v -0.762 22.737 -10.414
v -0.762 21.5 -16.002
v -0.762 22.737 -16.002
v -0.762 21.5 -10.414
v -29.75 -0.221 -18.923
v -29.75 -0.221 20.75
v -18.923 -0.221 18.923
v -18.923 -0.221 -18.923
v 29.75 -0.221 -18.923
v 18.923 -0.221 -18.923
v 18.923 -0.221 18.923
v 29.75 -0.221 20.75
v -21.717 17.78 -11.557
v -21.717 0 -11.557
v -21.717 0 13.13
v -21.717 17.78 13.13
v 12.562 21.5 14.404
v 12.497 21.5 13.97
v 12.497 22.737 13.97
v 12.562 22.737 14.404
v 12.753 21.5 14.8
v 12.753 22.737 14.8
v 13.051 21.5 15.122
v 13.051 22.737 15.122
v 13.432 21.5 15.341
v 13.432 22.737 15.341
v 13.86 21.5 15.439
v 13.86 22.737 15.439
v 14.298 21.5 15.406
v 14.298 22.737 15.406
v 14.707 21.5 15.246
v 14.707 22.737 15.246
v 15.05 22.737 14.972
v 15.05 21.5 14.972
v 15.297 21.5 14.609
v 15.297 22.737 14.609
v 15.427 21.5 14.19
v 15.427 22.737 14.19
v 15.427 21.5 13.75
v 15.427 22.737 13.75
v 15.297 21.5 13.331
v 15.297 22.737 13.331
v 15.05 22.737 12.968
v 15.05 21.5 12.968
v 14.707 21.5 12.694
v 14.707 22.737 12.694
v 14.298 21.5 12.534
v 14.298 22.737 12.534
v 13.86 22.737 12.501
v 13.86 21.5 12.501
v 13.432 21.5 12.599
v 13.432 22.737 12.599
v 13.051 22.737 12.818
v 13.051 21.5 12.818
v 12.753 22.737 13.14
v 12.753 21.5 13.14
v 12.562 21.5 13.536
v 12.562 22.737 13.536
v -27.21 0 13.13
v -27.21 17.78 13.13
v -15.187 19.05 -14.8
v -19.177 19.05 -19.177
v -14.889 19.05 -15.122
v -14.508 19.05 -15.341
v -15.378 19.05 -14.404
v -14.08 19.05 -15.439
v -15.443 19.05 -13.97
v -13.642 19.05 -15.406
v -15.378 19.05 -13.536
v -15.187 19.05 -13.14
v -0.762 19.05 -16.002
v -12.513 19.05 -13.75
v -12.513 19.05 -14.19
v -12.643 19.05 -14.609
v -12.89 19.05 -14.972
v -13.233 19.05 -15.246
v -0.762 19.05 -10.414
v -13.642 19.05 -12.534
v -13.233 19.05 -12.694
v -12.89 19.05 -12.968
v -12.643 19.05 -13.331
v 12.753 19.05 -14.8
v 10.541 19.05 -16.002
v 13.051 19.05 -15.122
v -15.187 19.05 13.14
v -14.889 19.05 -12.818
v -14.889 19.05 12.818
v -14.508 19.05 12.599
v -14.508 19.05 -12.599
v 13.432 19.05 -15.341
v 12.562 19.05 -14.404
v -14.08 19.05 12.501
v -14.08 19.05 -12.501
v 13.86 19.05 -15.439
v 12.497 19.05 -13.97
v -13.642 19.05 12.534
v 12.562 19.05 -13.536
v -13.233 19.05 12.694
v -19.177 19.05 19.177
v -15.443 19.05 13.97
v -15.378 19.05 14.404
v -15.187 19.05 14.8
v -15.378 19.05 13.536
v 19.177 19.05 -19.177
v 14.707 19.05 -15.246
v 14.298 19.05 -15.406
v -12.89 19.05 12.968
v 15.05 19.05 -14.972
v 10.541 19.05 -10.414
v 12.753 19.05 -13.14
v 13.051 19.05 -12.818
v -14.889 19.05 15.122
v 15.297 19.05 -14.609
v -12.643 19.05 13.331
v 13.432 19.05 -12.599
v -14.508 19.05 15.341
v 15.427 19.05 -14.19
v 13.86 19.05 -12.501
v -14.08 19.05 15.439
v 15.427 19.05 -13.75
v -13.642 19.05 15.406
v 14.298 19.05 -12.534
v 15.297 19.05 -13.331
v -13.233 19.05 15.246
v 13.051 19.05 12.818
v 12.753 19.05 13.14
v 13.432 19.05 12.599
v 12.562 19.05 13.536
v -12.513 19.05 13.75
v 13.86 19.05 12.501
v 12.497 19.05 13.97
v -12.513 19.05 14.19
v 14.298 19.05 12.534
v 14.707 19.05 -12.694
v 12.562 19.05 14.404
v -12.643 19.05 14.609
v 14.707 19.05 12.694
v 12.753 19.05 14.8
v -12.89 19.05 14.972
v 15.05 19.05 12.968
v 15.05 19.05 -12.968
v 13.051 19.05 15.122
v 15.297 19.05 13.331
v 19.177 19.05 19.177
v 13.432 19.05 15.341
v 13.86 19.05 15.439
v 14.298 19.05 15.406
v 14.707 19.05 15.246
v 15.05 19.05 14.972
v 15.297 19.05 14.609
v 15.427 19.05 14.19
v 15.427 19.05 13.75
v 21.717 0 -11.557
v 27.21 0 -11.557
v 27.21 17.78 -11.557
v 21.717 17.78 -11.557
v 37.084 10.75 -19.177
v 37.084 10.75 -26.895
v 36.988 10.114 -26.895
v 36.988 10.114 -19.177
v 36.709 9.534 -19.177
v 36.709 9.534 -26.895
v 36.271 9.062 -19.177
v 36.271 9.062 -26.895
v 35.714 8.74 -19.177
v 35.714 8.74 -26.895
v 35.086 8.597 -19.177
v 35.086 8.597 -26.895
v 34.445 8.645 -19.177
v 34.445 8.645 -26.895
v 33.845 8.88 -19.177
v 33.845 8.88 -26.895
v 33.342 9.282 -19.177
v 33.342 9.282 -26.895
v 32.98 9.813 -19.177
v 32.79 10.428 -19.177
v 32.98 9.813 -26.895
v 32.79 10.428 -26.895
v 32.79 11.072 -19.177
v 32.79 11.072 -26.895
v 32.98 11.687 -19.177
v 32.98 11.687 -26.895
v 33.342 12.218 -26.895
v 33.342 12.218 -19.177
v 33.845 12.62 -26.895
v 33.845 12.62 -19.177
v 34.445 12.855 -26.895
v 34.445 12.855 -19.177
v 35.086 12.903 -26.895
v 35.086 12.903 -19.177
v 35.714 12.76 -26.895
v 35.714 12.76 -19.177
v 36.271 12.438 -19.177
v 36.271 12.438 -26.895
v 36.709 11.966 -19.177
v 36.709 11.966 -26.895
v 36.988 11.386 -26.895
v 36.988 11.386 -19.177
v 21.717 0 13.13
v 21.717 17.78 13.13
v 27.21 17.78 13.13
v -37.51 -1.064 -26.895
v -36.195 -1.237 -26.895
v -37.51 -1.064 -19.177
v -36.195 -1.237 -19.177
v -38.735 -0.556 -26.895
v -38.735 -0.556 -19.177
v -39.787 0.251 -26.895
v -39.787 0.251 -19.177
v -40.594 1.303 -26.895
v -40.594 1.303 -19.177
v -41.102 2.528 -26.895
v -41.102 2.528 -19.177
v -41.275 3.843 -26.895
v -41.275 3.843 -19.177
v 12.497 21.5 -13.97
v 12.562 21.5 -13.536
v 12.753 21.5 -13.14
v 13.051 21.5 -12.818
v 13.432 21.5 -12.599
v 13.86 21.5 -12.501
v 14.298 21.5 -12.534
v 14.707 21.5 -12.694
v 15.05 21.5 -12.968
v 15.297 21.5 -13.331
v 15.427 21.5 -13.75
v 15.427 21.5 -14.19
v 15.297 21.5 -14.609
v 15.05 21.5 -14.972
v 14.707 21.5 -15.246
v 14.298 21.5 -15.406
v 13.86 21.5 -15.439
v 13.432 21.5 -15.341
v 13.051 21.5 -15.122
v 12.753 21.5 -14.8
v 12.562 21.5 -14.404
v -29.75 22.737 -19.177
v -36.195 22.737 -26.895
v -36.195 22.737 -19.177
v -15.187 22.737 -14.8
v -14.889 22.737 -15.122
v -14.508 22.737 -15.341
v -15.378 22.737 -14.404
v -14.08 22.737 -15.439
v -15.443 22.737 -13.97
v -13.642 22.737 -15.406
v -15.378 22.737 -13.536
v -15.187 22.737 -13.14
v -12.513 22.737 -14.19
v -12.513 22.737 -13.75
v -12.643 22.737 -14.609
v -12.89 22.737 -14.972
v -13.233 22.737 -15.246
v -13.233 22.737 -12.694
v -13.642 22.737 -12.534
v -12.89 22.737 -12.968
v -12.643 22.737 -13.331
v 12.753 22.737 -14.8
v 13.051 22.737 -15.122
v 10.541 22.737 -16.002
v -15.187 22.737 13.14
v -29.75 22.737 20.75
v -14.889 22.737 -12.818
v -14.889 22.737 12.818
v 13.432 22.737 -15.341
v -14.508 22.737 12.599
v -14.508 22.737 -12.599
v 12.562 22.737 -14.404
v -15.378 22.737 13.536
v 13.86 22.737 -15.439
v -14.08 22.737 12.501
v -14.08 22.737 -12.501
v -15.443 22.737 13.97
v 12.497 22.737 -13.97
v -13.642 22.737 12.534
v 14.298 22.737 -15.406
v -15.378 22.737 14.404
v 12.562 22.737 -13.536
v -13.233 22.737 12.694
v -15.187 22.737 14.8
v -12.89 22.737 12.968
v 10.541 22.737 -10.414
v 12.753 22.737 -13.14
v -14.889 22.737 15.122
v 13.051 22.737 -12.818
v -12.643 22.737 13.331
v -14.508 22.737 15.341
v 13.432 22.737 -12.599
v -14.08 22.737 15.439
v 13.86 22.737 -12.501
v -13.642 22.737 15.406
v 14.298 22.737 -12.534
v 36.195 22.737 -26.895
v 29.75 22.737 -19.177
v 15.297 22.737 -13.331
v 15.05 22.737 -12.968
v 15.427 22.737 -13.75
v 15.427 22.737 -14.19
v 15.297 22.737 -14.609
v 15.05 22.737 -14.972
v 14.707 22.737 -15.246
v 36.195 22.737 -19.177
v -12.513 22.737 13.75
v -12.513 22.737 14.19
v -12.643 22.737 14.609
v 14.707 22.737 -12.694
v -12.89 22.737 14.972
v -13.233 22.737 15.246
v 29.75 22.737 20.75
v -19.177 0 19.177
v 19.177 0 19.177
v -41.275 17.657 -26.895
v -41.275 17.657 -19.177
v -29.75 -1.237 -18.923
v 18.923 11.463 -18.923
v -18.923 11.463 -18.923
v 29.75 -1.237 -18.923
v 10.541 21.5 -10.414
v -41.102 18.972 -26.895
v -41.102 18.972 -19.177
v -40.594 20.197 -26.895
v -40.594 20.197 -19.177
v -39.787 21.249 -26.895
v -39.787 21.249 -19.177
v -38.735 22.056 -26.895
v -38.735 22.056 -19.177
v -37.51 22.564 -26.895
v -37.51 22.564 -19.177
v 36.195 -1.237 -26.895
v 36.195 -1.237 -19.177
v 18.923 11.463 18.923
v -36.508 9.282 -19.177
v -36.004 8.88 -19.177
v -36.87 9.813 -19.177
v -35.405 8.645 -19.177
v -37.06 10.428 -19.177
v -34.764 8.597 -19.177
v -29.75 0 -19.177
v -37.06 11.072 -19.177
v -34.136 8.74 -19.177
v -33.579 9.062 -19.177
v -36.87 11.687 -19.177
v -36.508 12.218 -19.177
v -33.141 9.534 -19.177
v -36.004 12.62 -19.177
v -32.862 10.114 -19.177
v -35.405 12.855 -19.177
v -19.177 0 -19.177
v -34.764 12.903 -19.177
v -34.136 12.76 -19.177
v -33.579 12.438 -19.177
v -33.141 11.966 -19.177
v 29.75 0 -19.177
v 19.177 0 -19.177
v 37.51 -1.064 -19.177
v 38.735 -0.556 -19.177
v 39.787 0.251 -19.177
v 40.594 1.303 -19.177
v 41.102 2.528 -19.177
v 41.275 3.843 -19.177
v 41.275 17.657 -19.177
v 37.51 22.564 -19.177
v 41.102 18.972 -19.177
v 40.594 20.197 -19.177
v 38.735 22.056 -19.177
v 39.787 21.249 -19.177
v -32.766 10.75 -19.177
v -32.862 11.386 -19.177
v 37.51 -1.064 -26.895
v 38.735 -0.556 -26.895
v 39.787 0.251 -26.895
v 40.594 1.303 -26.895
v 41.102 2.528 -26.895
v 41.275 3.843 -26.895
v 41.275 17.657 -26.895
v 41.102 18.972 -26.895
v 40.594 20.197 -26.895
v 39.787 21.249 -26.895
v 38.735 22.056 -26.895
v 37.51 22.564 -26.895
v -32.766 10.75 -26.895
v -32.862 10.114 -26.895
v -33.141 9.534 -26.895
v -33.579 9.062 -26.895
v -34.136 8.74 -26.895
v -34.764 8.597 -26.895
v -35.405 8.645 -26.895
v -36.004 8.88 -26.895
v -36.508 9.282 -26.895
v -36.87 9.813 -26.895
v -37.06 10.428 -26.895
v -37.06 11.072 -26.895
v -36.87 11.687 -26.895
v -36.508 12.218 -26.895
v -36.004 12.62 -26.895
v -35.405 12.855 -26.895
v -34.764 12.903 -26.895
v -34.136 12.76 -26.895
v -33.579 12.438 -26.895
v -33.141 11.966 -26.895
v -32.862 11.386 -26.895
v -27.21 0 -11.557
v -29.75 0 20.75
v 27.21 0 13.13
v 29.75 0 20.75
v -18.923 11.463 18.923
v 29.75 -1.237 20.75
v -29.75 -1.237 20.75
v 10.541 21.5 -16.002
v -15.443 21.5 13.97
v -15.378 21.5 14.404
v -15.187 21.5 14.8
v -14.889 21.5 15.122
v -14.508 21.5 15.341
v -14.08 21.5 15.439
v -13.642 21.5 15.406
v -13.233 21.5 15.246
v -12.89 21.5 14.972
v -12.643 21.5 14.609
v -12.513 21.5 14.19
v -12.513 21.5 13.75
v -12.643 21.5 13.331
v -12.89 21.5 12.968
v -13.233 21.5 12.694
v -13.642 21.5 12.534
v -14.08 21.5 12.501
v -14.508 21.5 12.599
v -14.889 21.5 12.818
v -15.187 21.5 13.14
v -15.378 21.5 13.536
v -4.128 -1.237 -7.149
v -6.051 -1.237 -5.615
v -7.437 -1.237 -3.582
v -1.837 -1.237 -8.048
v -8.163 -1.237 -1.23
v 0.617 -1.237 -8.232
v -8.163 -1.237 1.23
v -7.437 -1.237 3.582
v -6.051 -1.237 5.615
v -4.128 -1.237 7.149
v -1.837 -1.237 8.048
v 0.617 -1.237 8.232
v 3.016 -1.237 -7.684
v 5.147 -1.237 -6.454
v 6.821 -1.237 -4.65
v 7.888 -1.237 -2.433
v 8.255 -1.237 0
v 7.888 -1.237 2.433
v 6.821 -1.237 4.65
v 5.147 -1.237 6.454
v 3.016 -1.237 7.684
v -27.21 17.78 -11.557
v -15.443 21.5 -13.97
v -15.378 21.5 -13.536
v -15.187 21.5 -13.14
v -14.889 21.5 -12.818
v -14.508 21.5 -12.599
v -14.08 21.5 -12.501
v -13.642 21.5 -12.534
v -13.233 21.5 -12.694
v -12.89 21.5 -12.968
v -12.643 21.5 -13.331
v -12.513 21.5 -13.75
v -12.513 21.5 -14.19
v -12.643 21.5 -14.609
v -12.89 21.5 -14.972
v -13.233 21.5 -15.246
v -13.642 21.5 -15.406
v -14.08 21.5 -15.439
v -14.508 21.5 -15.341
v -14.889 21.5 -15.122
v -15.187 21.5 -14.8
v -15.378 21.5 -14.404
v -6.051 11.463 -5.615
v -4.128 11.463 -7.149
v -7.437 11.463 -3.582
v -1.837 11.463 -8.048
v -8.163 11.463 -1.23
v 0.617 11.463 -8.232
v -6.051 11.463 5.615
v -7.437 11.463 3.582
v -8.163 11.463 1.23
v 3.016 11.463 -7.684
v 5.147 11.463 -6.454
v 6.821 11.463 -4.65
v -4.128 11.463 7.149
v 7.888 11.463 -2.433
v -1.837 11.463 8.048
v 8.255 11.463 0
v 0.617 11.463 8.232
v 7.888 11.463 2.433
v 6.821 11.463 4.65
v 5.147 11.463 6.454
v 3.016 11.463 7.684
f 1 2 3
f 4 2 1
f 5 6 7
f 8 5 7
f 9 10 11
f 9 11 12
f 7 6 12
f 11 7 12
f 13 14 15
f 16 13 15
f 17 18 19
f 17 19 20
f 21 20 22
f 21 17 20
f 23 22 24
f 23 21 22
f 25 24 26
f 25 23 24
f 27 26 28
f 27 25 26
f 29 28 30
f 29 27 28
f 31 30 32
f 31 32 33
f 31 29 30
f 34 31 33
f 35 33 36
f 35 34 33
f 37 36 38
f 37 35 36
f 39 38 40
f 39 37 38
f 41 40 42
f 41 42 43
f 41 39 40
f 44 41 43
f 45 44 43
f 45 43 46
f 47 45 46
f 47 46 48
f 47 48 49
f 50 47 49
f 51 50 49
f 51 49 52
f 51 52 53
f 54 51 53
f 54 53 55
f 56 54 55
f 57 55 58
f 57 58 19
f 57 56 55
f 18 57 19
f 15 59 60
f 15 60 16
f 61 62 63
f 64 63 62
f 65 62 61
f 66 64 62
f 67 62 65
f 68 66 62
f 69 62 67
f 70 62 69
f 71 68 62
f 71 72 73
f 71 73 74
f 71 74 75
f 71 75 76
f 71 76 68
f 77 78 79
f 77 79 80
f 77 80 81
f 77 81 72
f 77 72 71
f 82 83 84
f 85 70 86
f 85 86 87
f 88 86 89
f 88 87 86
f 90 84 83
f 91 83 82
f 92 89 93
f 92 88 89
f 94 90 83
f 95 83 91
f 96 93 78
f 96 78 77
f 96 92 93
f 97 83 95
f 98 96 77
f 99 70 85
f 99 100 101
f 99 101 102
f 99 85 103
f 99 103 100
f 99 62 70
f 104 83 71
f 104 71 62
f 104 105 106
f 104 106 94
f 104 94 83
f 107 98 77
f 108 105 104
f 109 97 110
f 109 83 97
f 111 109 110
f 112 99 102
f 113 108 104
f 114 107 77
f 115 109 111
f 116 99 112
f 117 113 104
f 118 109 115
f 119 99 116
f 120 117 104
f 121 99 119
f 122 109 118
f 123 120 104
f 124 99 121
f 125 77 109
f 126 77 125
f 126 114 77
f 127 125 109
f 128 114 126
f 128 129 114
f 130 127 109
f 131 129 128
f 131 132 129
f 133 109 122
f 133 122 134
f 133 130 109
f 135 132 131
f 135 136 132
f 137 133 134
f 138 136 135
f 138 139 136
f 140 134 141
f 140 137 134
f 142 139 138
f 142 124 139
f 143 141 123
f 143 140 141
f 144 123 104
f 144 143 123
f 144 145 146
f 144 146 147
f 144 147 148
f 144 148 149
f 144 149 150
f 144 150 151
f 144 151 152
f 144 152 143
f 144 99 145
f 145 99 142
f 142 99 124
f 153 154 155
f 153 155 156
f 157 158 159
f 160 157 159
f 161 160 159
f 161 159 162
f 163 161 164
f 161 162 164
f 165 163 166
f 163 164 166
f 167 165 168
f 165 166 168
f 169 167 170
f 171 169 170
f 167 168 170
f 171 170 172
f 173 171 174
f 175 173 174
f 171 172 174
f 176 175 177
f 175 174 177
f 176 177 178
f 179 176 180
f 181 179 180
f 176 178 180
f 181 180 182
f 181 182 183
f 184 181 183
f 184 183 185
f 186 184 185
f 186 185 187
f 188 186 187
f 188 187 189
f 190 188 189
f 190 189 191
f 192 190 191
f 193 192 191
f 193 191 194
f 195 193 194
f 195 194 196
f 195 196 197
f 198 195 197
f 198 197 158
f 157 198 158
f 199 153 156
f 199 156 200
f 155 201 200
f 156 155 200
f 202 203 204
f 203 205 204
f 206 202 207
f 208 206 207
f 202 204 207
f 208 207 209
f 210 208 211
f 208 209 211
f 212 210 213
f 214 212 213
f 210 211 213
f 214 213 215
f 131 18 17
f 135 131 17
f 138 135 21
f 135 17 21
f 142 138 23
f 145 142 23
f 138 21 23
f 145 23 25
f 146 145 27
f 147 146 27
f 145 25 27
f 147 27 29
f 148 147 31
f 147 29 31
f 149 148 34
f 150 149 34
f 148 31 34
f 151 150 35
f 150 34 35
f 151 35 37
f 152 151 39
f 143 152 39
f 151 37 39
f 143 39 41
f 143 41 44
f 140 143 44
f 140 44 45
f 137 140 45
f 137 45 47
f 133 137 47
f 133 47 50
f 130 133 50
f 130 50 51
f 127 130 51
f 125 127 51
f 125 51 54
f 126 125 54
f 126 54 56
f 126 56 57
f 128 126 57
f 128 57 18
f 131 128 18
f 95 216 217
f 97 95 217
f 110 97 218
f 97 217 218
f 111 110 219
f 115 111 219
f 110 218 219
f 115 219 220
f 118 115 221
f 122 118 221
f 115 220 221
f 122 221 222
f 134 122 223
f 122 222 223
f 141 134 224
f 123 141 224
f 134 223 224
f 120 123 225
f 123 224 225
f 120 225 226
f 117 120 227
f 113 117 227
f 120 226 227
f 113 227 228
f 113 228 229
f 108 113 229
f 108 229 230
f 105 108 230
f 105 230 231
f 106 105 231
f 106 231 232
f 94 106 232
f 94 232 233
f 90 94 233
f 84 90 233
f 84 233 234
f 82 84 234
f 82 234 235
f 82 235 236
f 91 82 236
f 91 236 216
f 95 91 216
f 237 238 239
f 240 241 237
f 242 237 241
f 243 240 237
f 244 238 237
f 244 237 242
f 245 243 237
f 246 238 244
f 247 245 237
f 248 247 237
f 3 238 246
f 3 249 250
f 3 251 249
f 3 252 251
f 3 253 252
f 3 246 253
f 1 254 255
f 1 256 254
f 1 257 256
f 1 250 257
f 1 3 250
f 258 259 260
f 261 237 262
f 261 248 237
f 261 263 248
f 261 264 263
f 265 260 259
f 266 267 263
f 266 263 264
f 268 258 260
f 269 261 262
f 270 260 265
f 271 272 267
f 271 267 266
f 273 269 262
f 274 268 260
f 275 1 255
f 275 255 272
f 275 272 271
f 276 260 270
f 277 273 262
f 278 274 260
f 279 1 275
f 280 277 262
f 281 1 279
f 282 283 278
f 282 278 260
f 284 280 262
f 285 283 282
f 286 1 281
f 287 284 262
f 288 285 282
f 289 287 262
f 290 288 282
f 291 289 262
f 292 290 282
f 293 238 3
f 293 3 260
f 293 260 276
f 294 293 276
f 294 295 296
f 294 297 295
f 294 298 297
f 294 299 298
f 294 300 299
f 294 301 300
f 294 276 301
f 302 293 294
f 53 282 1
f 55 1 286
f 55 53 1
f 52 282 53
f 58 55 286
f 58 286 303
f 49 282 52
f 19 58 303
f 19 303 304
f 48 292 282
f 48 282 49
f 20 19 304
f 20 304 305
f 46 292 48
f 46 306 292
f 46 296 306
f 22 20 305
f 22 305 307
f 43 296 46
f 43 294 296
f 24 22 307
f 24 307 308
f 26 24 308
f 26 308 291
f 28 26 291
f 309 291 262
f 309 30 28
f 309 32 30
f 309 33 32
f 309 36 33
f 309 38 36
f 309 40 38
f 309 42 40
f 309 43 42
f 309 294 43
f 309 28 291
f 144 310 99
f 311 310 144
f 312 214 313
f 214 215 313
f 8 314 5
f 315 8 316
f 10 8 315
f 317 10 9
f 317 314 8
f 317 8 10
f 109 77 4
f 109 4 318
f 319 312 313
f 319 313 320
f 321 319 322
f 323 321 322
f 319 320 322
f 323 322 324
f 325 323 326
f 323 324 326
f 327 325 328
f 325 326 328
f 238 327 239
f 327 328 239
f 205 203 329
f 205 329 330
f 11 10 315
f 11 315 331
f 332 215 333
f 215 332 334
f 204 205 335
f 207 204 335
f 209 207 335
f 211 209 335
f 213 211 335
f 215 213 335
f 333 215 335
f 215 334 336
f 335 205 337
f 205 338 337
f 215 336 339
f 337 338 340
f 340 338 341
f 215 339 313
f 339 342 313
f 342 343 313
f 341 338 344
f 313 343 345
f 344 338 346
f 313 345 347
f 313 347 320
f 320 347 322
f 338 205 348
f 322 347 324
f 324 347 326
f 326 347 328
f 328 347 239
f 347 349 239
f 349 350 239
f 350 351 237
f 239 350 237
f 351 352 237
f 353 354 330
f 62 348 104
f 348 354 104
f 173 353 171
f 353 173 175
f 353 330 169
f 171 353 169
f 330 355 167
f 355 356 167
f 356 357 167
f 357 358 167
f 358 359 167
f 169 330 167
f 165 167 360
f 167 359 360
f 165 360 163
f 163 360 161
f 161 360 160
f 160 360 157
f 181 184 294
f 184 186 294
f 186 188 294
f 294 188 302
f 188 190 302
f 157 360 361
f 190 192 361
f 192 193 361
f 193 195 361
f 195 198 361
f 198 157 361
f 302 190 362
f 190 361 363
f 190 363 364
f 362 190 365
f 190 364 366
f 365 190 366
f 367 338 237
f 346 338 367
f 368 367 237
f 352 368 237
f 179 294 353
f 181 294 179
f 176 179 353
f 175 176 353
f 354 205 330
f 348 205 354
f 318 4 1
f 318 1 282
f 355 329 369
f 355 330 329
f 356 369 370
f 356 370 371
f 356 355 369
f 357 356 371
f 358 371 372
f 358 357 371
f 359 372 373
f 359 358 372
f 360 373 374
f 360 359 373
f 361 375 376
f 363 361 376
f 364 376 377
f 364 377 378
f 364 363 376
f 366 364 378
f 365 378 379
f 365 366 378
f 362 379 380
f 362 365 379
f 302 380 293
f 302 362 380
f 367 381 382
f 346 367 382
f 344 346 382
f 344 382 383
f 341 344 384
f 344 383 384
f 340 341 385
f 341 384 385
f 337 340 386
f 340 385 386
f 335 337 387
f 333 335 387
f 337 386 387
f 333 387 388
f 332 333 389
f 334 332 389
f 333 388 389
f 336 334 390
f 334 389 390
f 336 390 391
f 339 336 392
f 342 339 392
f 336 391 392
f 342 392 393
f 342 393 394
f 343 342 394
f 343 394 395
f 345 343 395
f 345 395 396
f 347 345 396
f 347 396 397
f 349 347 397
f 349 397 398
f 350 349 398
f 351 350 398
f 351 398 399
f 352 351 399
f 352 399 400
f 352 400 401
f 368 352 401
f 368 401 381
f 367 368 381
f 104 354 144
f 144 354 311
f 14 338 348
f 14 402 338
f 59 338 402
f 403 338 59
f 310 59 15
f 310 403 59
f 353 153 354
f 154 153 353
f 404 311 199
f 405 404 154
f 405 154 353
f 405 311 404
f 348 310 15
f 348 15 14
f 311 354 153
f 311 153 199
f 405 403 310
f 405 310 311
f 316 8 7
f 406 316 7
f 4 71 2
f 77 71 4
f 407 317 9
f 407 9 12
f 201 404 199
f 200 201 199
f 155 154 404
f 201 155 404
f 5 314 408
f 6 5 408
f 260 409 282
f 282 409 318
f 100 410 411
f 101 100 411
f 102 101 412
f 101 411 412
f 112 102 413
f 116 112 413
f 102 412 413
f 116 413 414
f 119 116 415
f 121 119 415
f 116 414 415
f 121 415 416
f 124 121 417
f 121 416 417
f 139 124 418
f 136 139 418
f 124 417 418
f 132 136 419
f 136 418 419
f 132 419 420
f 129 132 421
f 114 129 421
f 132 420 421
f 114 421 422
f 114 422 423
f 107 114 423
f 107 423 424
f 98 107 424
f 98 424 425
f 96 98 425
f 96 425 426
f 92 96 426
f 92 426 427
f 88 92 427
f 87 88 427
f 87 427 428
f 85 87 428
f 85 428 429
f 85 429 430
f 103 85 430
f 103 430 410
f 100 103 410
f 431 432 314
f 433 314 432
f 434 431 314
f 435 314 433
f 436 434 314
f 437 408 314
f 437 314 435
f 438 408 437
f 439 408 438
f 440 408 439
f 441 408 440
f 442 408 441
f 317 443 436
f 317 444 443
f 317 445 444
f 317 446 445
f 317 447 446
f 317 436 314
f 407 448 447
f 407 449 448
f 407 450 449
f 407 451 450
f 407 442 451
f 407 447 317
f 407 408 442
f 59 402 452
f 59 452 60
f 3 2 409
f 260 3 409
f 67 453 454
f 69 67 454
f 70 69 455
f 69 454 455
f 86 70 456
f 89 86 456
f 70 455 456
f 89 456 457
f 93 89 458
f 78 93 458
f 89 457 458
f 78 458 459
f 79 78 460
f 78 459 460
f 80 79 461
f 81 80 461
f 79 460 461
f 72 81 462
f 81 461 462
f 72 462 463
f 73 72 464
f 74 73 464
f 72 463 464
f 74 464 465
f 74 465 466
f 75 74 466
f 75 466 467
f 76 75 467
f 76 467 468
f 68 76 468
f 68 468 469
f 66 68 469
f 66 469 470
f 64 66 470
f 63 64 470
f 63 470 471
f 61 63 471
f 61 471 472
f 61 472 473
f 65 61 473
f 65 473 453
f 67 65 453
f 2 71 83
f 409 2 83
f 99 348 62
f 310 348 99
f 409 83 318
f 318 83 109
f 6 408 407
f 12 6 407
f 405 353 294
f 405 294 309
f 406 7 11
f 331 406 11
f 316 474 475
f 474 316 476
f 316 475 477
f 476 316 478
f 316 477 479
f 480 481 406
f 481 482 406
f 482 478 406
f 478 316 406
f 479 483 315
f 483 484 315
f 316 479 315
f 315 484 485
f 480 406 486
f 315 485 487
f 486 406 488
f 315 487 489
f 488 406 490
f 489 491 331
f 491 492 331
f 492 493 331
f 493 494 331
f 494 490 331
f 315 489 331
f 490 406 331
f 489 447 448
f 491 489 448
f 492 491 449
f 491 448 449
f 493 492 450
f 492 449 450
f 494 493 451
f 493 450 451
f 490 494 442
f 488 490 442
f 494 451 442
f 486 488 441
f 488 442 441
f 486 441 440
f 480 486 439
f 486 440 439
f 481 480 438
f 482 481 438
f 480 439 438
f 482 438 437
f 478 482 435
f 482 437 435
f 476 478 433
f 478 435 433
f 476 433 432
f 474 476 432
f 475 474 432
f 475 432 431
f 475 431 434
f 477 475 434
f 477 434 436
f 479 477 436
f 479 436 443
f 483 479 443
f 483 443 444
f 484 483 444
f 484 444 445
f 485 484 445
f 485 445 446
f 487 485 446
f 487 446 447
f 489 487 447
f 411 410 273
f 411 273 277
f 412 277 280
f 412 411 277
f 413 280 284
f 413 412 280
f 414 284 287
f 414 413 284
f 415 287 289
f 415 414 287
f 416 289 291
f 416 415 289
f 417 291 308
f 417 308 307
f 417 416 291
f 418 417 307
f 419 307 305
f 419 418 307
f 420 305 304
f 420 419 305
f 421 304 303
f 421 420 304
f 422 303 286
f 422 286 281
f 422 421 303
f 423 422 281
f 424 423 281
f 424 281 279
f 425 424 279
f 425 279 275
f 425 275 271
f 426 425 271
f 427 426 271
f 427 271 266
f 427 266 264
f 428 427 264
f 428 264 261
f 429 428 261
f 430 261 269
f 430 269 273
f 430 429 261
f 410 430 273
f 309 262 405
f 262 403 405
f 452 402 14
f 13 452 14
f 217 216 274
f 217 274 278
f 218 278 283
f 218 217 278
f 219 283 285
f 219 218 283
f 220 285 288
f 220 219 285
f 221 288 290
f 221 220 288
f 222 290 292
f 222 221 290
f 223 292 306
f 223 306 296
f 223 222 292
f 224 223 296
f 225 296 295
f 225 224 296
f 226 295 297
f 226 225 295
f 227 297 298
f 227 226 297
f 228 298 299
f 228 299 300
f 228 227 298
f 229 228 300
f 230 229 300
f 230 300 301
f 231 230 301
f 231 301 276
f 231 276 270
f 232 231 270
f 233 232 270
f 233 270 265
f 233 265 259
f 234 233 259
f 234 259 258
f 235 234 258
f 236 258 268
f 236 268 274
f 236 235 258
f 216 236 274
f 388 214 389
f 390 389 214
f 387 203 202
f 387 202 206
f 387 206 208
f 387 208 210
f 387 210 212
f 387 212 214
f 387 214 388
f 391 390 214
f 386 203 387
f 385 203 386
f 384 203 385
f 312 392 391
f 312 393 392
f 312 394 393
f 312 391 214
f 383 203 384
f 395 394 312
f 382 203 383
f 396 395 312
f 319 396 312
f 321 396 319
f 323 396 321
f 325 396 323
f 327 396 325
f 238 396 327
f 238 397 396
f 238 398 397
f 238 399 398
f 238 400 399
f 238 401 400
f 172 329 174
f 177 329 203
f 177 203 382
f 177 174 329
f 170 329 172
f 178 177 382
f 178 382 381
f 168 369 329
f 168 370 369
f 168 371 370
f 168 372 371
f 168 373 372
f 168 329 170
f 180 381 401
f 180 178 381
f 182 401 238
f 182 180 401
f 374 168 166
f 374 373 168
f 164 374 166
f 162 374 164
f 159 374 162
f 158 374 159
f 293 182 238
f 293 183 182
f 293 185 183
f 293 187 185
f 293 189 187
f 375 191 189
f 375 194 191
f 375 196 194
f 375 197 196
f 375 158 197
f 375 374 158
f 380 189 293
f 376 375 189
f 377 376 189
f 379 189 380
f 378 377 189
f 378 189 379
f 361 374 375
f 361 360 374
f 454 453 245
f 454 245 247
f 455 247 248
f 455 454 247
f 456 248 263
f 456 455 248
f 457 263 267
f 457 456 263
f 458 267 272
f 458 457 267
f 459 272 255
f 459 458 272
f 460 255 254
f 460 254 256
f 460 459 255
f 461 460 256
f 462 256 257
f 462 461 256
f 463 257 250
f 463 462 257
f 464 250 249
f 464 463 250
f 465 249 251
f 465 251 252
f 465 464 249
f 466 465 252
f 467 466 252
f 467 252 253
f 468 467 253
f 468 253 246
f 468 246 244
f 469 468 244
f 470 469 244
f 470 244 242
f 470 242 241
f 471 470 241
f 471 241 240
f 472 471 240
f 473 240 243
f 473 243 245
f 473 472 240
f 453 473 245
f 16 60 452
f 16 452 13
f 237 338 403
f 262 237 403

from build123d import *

# Parameters (mm, degrees)
F0_W      = 59.5
F0_H      = 41.5
F0_R      = 6
F0_R_2    = 11.5
F1_DEPTH  = 21.5
F7_W      = 38.354
F7_H      = 38.354
F8_DEPTH  = 19.05
F9_W      = 11.303
F9_H      = 5.588
F10_DEPTH = 2.451
F12_D     = 2.9464
F13_W     = 23.974
F13_H     = 7.718
F13_W_2   = 20.828
F13_H_2   = 4.572
F14_DEPTH = 59.5
F15_DEPTH = 1.237
F16_W     = 5.493
F16_H     = 24.687
F17_DEPTH = 17.78
F18_W     = 37.846
F18_H     = 37.846
F18_R     = 8.255
F19_DEPTH = 12.7
F20_W     = 59.5
F20_H     = 39.673
F20_R     = 8.255
F21_DEPTH = 1.016
F22_W     = 23.974
F22_H     = 7.718
F23_DEPTH = 41.275
F24_R     = 2.159
F25_DEPTH = 25.4
F26_R     = 5.08


# Not quite as in the source:
# - a feature of the source that left no trace in its solid (it failed there, or was rolled back) is left out
# - a pattern or mirror of a feature is missing from the dataset's text; its kind, count and spacing are read off the source's solid


with BuildPart() as f1:
    # F0 (on Front) → F1 (new body)
    with BuildSketch(Plane.XZ):
        Rectangle(F0_W, F0_H)
        with Locations((-17.25, -10.75)):
            Circle(F0_R, mode=Mode.SUBTRACT)
        with BuildLine():
            ThreePointArc((-23.75, 14.75), (-23.4571067812, 15.4571067812), (-22.75, 15.75))
            Line((-22.75, 15.75), (-11.25, 15.75))
            ThreePointArc((-11.25, 15.75), (-10.5428932188, 15.4571067812), (-10.25, 14.75))
            Line((-10.25, 14.75), (-10.25, -0.25))
            ThreePointArc((-10.25, -0.25), (-10.5428932188, -0.9571067812), (-11.25, -1.25))
            Line((-11.25, -1.25), (-22.75, -1.25))
            ThreePointArc((-22.75, -1.25), (-23.4571067812, -0.9571067812), (-23.75, -0.25))
            Line((-23.75, -0.25), (-23.75, 14.75))
        make_face(mode=Mode.SUBTRACT)
        with Locations((14.45, 7.05)):
            Circle(F0_R_2, mode=Mode.SUBTRACT)
        with BuildLine():
            Line((-11.25, 15.75), (-22.75, 15.75))
            ThreePointArc((-22.75, 15.75), (-23.4571067812, 15.4571067812), (-23.75, 14.75))
            Line((-23.75, 14.75), (-23.75, -0.25))
            ThreePointArc((-23.75, -0.25), (-23.4571067812, -0.9571067812), (-22.75, -1.25))
            Line((-22.75, -1.25), (-11.25, -1.25))
            ThreePointArc((-11.25, -1.25), (-10.5428932188, -0.9571067812), (-10.25, -0.25))
            Line((-10.25, -0.25), (-10.25, 14.75))
            ThreePointArc((-10.25, 14.75), (-10.5428932188, 15.4571067812), (-11.25, 15.75))
        make_face()
        with Locations((14.45, 7.05)):
            Circle(F0_R_2)
        with Locations((-17.25, -10.75)):
            Circle(F0_R)
    extrude(amount=-F1_DEPTH)

    # F7 (on face) → F8 (cut)
    with BuildSketch(Plane.XZ):
        Rectangle(F7_W, F7_H)
    extrude(amount=-F8_DEPTH, mode=Mode.SUBTRACT)

    # F9 (on face) → F10 (cut, through all)
    with BuildSketch(Plane.XZ.offset(-19.05)):
        with Locations((4.8895, -13.208)):
            Rectangle(F9_W, F9_H)
    extrude(amount=-F10_DEPTH, mode=Mode.SUBTRACT)

    # F12 (through all)
    with Locations(Plane.XZ.offset(-19.05)):
        with Locations((-13.97, 13.97), (13.97, 13.97), (13.97, -13.97), (-13.97, -13.97)):
            Hole(F12_D / 2)

    # F13 (on face) → F14 (join, through all)
    with BuildSketch(Plane.YZ.offset(29.75)):
        with Locations((10.75, -23.036)):
            Rectangle(F13_W, F13_H)
        with Locations((10.75, -23.036)):
            Rectangle(F13_W_2, F13_H_2, mode=Mode.SUBTRACT)
    extrude(amount=-F14_DEPTH)

    # F15 (add, through all): a face of the model
    f15_faces = [f1.faces().sort_by_distance(p)[0] for p in [
        (-0.1351406862, 21.5, 1.1826798979),
    ]]
    extrude(f15_faces, amount=F15_DEPTH)

    # F16 (on face) → F17 (cut)
    with BuildSketch(Plane.XZ):
        with Locations((-24.4635, 0.7865)):
            Rectangle(F16_W, F16_H)
    f17 = extrude(amount=-F17_DEPTH, mode=Mode.SUBTRACT)

    # F17_copies: F17 across plane
    add(f17.mirror(Plane(origin=(0, 0, 0), x_dir=(0, 0, 1), z_dir=(1, 0, 0))), mode=Mode.SUBTRACT)

    # F22 (on Right) → F23 (join, symmetric)
    with BuildSketch(Plane.YZ):
        with Locations((10.75, -23.036)):
            Rectangle(F22_W, F22_H)
    extrude(amount=F23_DEPTH, both=True)

    # F24 (on face) → F25 (cut)
    with BuildSketch(Plane(origin=(0, 0, -26.895), x_dir=(1, 0, 0), z_dir=(0, 0, -1))):
        with Locations((-34.925, -10.75)):
            Circle(F24_R)
        with Locations((34.925, -10.75)):
            Circle(F24_R)
    extrude(amount=-F25_DEPTH, mode=Mode.SUBTRACT)

    # F26
    f26_edges = [f1.edges().sort_by_distance(p)[0] for p in [
        (-41.275, 22.737, -23.036),
        (-41.275, -1.237, -23.036),
        (41.275, 22.737, -23.036),
        (41.275, -1.237, -23.036),
    ]]
    fillet(f26_edges, radius=F26_R)


with BuildPart() as f19:
    # F18 (on face) → F19 (new body)
    with BuildSketch(Plane.XZ.offset(1.237)):
        Rectangle(F18_W, F18_H)
        Circle(F18_R, mode=Mode.SUBTRACT)
    extrude(amount=-F19_DEPTH)

    # F20 (on face) → F21 (join)
    with BuildSketch(Plane.XZ.offset(1.237)):
        with Locations((0, 0.9135)):
            Rectangle(F20_W, F20_H)
        Circle(F20_R, mode=Mode.SUBTRACT)
    extrude(amount=-F21_DEPTH)


solid = Compound([f1.part, f19.part])
